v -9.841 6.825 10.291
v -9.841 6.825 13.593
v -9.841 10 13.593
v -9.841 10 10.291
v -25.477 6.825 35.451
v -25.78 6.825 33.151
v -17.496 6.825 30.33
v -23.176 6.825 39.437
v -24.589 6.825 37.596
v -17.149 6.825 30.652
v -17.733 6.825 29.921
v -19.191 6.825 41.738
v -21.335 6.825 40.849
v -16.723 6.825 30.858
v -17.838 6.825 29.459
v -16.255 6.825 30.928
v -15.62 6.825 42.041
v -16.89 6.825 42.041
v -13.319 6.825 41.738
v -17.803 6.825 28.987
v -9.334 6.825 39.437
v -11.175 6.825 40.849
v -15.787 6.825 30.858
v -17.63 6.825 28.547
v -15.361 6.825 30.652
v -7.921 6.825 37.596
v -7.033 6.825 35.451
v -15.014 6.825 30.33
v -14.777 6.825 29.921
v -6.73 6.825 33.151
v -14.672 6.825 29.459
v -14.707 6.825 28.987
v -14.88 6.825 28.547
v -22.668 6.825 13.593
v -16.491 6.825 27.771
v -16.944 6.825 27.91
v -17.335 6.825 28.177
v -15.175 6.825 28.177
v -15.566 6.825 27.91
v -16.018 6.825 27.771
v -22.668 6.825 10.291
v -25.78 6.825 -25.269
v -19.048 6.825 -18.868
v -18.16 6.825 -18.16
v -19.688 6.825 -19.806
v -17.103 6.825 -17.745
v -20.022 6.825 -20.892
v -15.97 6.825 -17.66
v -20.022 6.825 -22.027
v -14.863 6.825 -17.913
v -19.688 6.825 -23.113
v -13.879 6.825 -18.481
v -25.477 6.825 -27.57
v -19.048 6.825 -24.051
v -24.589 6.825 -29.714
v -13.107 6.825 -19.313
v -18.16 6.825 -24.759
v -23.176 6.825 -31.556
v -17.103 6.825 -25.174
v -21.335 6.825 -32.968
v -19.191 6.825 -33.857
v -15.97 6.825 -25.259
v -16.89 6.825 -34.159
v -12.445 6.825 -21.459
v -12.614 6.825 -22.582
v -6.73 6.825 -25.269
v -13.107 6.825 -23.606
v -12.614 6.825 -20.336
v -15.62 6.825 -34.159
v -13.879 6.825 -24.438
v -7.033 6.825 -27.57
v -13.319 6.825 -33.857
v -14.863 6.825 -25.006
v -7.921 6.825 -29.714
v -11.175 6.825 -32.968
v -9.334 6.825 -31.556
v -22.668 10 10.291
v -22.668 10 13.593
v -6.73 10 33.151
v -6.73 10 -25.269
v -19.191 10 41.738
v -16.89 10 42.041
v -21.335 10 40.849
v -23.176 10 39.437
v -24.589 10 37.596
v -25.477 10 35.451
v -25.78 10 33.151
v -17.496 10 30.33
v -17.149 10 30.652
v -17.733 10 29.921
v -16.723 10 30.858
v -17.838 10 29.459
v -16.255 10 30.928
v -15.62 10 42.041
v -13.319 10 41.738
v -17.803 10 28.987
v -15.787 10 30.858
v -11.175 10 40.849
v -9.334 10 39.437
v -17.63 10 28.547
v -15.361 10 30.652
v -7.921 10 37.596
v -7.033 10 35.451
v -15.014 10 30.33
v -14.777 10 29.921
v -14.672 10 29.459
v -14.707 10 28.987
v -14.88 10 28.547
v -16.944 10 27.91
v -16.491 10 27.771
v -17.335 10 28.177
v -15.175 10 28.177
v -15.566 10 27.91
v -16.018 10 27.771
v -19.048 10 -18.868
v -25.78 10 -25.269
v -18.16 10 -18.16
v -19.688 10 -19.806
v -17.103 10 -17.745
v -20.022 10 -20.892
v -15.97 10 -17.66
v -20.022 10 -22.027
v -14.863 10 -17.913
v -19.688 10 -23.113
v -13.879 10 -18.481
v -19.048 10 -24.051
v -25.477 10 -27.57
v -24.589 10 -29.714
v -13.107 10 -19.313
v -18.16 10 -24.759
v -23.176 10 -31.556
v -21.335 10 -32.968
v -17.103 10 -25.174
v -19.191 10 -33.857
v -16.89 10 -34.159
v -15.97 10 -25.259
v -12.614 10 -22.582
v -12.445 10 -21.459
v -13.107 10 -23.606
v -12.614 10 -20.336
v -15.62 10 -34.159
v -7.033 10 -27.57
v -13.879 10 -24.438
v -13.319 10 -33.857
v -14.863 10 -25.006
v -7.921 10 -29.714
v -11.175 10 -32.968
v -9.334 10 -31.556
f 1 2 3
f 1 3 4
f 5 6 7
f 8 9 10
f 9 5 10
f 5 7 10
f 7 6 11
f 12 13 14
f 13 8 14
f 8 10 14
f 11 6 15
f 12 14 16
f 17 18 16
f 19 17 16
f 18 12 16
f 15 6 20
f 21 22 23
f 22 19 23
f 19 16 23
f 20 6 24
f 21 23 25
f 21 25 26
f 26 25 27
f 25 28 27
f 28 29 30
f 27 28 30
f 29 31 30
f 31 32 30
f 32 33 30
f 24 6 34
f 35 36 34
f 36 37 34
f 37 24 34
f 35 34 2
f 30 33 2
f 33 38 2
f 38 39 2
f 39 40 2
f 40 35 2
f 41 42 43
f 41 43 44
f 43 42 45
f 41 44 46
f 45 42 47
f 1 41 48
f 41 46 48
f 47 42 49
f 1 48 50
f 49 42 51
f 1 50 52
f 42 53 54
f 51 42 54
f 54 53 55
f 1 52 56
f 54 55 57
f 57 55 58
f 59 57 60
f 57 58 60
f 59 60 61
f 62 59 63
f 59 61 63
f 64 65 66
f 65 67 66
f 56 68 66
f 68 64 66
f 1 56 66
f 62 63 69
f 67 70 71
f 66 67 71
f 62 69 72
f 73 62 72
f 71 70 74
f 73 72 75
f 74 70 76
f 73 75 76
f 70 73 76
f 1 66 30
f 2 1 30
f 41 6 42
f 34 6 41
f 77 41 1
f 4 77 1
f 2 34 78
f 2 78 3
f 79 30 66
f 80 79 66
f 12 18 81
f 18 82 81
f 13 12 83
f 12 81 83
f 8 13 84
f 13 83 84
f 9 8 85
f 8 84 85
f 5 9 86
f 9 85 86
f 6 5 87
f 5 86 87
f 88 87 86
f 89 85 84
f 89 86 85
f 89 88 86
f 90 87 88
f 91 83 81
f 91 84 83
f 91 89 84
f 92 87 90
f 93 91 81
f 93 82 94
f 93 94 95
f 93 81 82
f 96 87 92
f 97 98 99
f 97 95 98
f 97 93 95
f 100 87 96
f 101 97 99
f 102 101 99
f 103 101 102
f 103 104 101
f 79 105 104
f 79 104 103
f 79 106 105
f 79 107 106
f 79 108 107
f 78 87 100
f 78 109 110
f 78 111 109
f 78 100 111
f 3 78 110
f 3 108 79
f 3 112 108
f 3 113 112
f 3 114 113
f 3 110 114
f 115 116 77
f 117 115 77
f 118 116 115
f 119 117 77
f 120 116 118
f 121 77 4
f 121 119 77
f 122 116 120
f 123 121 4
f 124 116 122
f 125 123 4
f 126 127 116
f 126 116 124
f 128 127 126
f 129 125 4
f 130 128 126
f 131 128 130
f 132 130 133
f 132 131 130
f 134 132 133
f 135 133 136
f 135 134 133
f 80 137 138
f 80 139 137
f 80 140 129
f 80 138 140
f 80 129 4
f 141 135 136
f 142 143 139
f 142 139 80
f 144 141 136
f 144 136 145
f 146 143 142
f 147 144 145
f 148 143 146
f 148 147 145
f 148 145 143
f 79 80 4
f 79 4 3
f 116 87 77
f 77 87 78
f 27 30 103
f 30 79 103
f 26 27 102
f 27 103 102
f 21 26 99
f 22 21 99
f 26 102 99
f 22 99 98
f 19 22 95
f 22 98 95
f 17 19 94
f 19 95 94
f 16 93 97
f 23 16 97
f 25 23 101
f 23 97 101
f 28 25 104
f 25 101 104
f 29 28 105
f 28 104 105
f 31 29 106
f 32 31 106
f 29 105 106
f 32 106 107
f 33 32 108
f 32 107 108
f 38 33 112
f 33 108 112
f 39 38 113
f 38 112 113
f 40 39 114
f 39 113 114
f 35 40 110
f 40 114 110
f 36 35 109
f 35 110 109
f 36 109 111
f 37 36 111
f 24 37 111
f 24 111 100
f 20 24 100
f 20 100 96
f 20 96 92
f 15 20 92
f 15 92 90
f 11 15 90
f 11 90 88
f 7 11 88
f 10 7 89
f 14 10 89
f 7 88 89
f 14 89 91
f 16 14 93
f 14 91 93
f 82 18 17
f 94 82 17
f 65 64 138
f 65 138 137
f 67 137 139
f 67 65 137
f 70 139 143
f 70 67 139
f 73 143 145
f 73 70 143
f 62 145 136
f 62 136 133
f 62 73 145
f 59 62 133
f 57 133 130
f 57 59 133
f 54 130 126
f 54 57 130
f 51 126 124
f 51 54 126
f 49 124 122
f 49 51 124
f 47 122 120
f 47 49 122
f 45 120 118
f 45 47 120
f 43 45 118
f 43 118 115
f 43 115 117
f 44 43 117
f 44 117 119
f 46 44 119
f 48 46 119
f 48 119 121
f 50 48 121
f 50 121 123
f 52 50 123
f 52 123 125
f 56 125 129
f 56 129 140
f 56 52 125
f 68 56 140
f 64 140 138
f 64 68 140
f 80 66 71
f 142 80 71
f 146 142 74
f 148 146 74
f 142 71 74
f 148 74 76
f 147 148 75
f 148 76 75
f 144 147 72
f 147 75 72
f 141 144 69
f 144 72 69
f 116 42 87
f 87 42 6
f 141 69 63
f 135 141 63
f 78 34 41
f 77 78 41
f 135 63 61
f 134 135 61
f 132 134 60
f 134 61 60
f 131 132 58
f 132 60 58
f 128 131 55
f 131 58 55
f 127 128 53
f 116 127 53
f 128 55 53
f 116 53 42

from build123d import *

# Parameters (mm, degrees)
STEM_START                = 6.825155764
STEM_OTHER_SIDE_OUTLINE_W = 12.827
STEM_OTHER_SIDE_OUTLINE_H = 3.302
STEM_OTHER_SIDE_OUTLINE_R = 3.81
STEM_OTHER_SIDE_DEPTH     = 3.175
SKETCH2_R                 = 1.5875
CUT_EXTRUDE1_DEPTH        = 3.175
FILLET1_R                 = 8.89
FILLET2_R                 = 8.89


# Read off the part's stored shape, not the designer's step: Stem Other Side
with BuildPart() as part:
    # Stem Other Side outline → Stem Other Side (new body)
    with BuildSketch(Plane(origin=(0, 0, 0), x_dir=(1, 0, 0), z_dir=(0, 1, 0)).offset(STEM_START)):
        with BuildLine():
            Line((-15.619811821, 34.159467437), (-16.889811821, 34.159467437))
            ThreePointArc((-16.889811821, 34.159467437), (-23.175991106, 31.555646722), (-25.779811821, 25.269467437))
            Line((-25.779811821, 25.269467437), (-25.779811821, -42.040532563))
            Line((-25.779811821, -42.040532563), (-6.729811821, -42.040532563))
            Line((-6.729811821, -42.040532563), (-6.729811821, 25.269467437))
            ThreePointArc((-6.729811821, 25.269467437), (-9.333632536, 31.555646722), (-15.619811821, 34.159467437))
        make_face()
        with Locations((-16.254811821, -11.941532563)):
            Rectangle(STEM_OTHER_SIDE_OUTLINE_W, STEM_OTHER_SIDE_OUTLINE_H, mode=Mode.SUBTRACT)
        with Locations((-16.254811821, 21.459467437)):
            Circle(STEM_OTHER_SIDE_OUTLINE_R, mode=Mode.SUBTRACT)
    extrude(amount=STEM_OTHER_SIDE_DEPTH)

    # Sketch2 → Cut-Extrude1 (cut)
    with BuildSketch(Plane(origin=(0, 10.000155764, 0), x_dir=(1, 0, 0), z_dir=(0, 1, 0))):
        with Locations(Location((-16.254811821, -29.340532563, 0), (0, 0, 270))):
            Circle(SKETCH2_R)
    extrude(amount=-CUT_EXTRUDE1_DEPTH, mode=Mode.SUBTRACT)

    # Fillet1
    fillet1_edges = [part.edges().sort_by_distance(p)[0] for p in [
        (-6.729811821, 8.412655764, 42.040532563),
    ]]
    fillet(fillet1_edges, radius=FILLET1_R)

    # Fillet2
    fillet2_edges = [part.edges().sort_by_distance(p)[0] for p in [
        (-25.779811821, 8.412655764, 42.040532563),
    ]]
    fillet(fillet2_edges, radius=FILLET2_R)


solid = part.part
